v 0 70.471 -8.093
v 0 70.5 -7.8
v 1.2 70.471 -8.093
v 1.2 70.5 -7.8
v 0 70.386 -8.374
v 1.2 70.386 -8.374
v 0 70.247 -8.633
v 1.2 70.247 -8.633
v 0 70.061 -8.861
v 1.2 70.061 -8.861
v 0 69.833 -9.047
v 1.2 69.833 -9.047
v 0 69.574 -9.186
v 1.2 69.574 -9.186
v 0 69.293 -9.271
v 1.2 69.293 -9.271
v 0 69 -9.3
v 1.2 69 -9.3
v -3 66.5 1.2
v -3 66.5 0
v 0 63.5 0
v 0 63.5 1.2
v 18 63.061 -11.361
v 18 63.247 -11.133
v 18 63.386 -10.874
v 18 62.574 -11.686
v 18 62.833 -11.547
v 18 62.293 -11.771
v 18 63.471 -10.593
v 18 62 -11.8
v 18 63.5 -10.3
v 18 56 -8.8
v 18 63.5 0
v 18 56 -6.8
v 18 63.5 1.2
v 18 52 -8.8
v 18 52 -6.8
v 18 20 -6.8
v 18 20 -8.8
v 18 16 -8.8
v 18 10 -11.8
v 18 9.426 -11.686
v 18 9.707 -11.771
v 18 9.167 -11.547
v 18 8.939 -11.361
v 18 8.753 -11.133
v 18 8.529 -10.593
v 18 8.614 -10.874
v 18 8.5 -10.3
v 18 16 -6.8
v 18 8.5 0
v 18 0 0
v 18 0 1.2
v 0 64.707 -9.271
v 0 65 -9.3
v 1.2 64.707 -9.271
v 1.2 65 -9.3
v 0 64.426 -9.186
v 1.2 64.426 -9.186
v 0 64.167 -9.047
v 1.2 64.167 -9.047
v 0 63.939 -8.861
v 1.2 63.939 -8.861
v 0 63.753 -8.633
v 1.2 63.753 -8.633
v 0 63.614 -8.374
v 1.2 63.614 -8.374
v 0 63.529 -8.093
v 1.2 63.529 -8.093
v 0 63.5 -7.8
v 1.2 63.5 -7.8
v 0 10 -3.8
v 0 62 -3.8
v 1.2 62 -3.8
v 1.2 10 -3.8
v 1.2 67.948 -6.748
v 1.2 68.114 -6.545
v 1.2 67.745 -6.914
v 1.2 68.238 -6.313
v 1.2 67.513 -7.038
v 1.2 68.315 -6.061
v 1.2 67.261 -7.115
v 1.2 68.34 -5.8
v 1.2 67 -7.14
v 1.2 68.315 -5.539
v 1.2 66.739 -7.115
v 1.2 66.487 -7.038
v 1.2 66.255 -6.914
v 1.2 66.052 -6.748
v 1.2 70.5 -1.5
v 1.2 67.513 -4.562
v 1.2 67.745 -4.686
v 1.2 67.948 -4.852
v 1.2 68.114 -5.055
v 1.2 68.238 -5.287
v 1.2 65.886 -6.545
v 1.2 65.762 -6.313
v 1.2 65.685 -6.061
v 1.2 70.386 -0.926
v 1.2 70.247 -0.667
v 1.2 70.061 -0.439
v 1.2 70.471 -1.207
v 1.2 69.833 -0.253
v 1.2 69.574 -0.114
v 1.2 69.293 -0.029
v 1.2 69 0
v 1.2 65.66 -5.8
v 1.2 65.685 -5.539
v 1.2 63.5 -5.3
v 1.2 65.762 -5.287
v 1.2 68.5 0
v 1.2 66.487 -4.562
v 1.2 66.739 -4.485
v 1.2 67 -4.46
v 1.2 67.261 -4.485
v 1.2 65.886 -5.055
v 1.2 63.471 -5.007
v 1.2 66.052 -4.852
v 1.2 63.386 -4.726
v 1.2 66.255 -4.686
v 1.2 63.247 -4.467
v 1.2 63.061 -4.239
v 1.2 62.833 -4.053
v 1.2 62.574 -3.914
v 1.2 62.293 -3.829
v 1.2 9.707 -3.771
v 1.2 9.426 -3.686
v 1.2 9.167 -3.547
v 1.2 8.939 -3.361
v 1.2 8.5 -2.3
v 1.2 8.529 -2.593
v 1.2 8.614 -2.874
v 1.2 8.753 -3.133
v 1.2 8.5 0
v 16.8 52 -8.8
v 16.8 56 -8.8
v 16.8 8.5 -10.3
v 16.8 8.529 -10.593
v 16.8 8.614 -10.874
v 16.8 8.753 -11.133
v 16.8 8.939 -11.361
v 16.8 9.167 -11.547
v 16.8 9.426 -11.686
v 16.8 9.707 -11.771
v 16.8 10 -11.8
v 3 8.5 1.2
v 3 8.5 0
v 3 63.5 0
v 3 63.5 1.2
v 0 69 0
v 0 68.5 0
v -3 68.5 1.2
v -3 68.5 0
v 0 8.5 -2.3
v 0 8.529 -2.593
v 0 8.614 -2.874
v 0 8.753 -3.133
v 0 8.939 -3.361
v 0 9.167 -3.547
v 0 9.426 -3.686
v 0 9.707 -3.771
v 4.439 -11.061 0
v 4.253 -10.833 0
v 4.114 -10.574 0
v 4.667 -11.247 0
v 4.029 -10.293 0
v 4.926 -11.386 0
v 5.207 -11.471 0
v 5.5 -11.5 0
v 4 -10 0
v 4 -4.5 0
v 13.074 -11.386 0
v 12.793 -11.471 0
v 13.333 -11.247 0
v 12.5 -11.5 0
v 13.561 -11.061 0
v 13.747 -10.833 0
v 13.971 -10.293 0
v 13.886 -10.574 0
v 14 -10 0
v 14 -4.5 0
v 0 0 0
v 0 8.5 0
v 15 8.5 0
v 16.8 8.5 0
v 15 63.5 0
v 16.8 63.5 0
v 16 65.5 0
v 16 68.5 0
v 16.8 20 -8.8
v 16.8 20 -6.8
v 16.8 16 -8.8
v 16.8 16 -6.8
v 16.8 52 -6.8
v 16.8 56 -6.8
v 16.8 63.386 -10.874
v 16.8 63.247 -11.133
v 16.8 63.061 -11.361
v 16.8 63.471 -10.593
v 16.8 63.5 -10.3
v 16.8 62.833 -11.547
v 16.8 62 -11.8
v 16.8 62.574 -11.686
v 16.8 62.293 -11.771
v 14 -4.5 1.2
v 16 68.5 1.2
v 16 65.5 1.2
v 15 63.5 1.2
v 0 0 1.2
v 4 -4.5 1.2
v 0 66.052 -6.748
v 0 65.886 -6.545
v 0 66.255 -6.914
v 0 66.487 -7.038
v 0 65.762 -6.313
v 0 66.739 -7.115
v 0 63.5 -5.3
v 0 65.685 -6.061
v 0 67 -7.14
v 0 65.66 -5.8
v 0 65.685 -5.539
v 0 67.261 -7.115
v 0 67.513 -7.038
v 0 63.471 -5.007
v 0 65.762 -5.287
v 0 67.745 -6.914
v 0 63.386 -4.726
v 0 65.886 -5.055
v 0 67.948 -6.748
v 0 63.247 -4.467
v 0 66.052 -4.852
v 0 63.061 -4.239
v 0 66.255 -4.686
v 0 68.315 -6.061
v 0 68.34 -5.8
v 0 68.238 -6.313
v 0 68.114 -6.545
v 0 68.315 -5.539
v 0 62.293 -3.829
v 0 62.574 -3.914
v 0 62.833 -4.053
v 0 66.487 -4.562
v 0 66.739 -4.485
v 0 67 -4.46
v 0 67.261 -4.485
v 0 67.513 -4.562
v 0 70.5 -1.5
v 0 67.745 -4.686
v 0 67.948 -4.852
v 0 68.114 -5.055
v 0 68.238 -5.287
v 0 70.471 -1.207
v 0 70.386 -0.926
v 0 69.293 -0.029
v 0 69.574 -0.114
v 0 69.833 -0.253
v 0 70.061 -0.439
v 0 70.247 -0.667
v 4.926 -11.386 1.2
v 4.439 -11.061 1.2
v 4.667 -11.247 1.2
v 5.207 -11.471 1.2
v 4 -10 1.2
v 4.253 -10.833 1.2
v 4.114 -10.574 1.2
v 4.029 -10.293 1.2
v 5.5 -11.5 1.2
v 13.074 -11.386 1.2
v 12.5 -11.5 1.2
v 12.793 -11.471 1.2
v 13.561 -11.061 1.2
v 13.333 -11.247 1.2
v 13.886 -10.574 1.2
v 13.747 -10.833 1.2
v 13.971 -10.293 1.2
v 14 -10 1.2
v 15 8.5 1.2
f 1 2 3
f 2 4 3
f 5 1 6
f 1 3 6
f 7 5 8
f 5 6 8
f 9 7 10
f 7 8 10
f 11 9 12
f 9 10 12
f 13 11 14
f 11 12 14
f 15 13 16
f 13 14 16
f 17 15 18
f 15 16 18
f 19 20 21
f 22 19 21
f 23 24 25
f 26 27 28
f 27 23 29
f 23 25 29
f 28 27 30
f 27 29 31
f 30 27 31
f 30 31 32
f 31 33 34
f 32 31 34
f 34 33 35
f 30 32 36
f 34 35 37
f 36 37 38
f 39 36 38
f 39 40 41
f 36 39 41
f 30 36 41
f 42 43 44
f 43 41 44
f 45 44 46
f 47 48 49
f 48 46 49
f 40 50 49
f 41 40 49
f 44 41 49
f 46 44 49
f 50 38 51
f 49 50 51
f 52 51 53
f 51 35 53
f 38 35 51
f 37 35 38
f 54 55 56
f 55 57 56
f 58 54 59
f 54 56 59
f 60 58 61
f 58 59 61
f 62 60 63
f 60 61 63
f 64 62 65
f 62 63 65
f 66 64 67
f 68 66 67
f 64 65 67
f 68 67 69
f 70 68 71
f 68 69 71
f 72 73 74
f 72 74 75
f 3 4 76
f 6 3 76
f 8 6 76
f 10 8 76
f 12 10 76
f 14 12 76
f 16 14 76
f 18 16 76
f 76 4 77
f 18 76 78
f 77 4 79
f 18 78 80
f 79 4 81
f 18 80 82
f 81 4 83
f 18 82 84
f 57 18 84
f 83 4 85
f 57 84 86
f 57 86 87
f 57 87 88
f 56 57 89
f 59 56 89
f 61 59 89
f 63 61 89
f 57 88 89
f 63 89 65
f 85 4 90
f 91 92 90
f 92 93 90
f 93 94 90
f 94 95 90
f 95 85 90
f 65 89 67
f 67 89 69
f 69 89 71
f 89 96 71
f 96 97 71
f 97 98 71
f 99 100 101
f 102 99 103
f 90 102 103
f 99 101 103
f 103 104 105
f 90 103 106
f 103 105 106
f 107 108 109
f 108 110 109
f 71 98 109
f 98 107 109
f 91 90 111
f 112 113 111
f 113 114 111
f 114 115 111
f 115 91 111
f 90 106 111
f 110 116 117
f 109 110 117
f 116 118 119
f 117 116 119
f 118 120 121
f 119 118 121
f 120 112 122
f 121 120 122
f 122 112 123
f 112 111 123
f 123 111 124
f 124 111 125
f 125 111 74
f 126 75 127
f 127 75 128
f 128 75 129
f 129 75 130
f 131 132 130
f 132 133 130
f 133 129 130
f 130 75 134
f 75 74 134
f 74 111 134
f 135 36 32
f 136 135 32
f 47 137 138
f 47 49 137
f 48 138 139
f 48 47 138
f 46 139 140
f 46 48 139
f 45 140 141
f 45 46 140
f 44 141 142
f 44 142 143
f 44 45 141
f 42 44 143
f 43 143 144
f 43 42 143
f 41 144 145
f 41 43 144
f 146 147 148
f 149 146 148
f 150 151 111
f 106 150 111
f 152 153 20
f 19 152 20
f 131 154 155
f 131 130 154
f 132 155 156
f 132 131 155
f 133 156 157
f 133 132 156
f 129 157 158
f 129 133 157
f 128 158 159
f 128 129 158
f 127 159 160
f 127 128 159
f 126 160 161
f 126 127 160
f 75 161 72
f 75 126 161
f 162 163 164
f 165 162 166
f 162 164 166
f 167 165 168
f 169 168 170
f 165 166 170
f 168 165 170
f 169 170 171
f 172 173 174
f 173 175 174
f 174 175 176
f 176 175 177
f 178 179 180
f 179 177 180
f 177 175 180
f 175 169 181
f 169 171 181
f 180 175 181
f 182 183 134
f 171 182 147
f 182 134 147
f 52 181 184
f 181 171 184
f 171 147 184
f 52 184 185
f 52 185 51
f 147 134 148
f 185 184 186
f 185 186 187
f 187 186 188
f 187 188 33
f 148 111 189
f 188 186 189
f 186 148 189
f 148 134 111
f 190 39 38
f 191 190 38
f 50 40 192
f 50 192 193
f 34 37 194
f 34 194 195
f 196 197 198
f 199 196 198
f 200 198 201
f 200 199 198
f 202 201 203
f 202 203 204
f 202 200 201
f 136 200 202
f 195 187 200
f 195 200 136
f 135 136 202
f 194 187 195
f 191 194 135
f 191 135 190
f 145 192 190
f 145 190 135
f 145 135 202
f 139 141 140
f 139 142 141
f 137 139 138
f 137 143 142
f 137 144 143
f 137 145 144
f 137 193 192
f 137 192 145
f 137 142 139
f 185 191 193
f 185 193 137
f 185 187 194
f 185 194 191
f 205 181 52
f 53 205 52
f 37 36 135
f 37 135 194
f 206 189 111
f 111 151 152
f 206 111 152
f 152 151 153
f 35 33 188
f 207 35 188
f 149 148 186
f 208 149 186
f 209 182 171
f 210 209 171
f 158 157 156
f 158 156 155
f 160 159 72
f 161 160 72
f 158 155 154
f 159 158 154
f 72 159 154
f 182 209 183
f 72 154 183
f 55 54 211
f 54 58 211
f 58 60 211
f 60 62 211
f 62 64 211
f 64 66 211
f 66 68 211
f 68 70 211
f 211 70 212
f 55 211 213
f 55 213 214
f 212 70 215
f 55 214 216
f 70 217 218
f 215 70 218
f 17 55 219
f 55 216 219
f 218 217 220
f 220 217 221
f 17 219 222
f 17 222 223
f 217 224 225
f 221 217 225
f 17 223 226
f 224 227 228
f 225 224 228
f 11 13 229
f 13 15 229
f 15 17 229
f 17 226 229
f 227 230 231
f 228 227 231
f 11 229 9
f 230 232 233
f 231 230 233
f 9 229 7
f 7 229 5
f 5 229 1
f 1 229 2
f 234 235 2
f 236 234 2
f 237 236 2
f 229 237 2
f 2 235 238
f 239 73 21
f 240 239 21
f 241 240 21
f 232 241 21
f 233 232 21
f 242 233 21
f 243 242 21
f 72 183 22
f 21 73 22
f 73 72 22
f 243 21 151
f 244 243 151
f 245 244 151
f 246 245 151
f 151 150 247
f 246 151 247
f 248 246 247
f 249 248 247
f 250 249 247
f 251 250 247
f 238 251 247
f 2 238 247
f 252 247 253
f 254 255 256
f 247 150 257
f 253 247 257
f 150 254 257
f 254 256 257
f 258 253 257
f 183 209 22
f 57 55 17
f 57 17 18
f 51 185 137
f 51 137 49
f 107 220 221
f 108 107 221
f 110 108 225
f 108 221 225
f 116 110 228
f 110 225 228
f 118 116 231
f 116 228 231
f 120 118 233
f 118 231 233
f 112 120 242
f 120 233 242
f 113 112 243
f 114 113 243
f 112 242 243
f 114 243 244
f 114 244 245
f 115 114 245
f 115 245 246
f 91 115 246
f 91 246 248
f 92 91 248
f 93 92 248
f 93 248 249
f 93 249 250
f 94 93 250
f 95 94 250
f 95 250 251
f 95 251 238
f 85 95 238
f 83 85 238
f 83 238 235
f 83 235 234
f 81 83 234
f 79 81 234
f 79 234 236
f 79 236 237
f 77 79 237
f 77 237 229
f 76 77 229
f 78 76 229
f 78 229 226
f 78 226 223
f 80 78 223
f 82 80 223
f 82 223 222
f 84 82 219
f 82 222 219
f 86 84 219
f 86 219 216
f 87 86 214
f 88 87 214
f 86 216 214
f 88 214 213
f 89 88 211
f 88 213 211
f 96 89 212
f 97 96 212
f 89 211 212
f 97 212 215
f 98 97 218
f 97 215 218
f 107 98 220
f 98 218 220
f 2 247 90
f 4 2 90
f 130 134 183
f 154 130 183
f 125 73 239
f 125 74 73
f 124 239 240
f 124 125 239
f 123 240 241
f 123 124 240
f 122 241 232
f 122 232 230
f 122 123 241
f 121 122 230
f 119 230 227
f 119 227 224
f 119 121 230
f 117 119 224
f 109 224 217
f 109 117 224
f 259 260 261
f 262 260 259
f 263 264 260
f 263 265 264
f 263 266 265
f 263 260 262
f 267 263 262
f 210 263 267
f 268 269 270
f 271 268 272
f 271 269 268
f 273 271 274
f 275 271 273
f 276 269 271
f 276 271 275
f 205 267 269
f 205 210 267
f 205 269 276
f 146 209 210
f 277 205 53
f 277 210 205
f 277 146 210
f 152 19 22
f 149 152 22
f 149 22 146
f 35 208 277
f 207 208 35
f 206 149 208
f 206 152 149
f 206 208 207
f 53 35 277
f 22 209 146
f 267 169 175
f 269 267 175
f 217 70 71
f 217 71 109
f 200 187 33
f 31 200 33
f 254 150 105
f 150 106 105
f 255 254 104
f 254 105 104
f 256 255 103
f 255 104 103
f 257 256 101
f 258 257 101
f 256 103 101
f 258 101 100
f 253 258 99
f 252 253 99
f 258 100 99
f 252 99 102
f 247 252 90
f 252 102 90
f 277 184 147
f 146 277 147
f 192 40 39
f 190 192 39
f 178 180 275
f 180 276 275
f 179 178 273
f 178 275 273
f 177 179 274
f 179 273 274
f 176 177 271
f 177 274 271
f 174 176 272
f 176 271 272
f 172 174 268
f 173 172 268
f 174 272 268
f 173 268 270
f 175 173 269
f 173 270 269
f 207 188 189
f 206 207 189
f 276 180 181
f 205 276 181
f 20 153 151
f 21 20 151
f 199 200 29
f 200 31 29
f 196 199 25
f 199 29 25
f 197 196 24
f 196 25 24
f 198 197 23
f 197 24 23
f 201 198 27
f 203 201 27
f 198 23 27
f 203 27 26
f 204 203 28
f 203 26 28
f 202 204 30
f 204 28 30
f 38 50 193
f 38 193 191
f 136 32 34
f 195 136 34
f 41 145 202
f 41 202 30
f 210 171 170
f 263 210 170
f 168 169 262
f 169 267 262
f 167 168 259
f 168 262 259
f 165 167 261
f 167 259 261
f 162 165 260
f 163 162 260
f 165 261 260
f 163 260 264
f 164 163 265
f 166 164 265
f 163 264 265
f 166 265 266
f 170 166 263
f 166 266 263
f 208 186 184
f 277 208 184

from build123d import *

# Parameters (mm, degrees)
F1_DEPTH = 1.2
F2_W     = 1.2
F2_H     = 55
F3_DEPTH = 11.8
F4_W     = 4
F4_H     = 2
F5_DEPTH = 25
F2_H_2   = 2
F6_DEPTH = 9.3
F7_W     = 55
F7_H     = 5.5
F7_R     = 1.3402800484
F8_DEPTH = 5
F11_R    = 1.5


with BuildPart() as f1:
    # F0 (on Top) → F1 (new body)
    with BuildSketch(Plane.XY):
        Polygon((0, 63.5), (0, 0), (18, 0), (18, 63.5), (15, 63.5), (15, 8.5), (3, 8.5), (3, 63.5), align=None)
        Polygon((18, 0), (0, 0), (4, -4.5), (4, -11.5), (14, -11.5), (14, -4.5), align=None)
        Polygon((-3, 66.5), (0, 63.5), (3, 63.5), (15, 63.5), (18, 63.5), (16, 65.5), (16, 68.5), (-3, 68.5), align=None)
    extrude(amount=F1_DEPTH)

    # F2 (on face) → F3 (join)
    with BuildSketch(Plane(origin=(0, 0, 0), x_dir=(1, 0, 0), z_dir=(0, 0, -1))):
        with Locations((17.4, -36)):
            Rectangle(F2_W, F2_H)
    extrude(amount=F3_DEPTH)

    # F4 (on face) → F5 (cut)
    with BuildSketch(Plane.YZ.offset(18)):
        with Locations((18, -7.8)):
            Rectangle(F4_W, F4_H)
        with Locations((54, -7.8)):
            Rectangle(F4_W, F4_H)
    extrude(amount=-F5_DEPTH, mode=Mode.SUBTRACT)

    # F2 (on face) → F6 (join)
    with BuildSketch(Plane(origin=(0, 0, 0), x_dir=(1, 0, 0), z_dir=(0, 0, -1))):
        Polygon((0, -68.5), (1.2, -68.5), (1.2, -8.5), (0, -8.5), (0, -63.5), align=None)
        with Locations((0.6, -69.5)):
            Rectangle(F2_W, F2_H_2)
    extrude(amount=F6_DEPTH)

    # F7 (on face) → F8 (cut)
    with BuildSketch(Plane(origin=(0, 0, 0), x_dir=(0, -1, 0), z_dir=(-1, 0, 0))):
        with Locations((-36, -6.55)):
            Rectangle(F7_W, F7_H)
        with Locations((-67, -5.8)):
            Circle(F7_R)
    extrude(amount=-F8_DEPTH, mode=Mode.SUBTRACT)

    # F11
    f11_edges = [f1.edges().sort_by_distance(p)[0] for p in [
        (0.6, 70.5, -9.3),
        (0.6, 63.5, -9.3),
        (0.6, 8.5, -3.8),
        (17.4, 8.5, -11.8),
        (17.4, 63.5, -11.8),
        (4, -11.5, 0.6),
        (14, -11.5, 0.6),
        (0.6, 70.5, 0),
        (0.6, 63.5, -3.8),
    ]]
    fillet(f11_edges, radius=F11_R)


solid = f1.part
